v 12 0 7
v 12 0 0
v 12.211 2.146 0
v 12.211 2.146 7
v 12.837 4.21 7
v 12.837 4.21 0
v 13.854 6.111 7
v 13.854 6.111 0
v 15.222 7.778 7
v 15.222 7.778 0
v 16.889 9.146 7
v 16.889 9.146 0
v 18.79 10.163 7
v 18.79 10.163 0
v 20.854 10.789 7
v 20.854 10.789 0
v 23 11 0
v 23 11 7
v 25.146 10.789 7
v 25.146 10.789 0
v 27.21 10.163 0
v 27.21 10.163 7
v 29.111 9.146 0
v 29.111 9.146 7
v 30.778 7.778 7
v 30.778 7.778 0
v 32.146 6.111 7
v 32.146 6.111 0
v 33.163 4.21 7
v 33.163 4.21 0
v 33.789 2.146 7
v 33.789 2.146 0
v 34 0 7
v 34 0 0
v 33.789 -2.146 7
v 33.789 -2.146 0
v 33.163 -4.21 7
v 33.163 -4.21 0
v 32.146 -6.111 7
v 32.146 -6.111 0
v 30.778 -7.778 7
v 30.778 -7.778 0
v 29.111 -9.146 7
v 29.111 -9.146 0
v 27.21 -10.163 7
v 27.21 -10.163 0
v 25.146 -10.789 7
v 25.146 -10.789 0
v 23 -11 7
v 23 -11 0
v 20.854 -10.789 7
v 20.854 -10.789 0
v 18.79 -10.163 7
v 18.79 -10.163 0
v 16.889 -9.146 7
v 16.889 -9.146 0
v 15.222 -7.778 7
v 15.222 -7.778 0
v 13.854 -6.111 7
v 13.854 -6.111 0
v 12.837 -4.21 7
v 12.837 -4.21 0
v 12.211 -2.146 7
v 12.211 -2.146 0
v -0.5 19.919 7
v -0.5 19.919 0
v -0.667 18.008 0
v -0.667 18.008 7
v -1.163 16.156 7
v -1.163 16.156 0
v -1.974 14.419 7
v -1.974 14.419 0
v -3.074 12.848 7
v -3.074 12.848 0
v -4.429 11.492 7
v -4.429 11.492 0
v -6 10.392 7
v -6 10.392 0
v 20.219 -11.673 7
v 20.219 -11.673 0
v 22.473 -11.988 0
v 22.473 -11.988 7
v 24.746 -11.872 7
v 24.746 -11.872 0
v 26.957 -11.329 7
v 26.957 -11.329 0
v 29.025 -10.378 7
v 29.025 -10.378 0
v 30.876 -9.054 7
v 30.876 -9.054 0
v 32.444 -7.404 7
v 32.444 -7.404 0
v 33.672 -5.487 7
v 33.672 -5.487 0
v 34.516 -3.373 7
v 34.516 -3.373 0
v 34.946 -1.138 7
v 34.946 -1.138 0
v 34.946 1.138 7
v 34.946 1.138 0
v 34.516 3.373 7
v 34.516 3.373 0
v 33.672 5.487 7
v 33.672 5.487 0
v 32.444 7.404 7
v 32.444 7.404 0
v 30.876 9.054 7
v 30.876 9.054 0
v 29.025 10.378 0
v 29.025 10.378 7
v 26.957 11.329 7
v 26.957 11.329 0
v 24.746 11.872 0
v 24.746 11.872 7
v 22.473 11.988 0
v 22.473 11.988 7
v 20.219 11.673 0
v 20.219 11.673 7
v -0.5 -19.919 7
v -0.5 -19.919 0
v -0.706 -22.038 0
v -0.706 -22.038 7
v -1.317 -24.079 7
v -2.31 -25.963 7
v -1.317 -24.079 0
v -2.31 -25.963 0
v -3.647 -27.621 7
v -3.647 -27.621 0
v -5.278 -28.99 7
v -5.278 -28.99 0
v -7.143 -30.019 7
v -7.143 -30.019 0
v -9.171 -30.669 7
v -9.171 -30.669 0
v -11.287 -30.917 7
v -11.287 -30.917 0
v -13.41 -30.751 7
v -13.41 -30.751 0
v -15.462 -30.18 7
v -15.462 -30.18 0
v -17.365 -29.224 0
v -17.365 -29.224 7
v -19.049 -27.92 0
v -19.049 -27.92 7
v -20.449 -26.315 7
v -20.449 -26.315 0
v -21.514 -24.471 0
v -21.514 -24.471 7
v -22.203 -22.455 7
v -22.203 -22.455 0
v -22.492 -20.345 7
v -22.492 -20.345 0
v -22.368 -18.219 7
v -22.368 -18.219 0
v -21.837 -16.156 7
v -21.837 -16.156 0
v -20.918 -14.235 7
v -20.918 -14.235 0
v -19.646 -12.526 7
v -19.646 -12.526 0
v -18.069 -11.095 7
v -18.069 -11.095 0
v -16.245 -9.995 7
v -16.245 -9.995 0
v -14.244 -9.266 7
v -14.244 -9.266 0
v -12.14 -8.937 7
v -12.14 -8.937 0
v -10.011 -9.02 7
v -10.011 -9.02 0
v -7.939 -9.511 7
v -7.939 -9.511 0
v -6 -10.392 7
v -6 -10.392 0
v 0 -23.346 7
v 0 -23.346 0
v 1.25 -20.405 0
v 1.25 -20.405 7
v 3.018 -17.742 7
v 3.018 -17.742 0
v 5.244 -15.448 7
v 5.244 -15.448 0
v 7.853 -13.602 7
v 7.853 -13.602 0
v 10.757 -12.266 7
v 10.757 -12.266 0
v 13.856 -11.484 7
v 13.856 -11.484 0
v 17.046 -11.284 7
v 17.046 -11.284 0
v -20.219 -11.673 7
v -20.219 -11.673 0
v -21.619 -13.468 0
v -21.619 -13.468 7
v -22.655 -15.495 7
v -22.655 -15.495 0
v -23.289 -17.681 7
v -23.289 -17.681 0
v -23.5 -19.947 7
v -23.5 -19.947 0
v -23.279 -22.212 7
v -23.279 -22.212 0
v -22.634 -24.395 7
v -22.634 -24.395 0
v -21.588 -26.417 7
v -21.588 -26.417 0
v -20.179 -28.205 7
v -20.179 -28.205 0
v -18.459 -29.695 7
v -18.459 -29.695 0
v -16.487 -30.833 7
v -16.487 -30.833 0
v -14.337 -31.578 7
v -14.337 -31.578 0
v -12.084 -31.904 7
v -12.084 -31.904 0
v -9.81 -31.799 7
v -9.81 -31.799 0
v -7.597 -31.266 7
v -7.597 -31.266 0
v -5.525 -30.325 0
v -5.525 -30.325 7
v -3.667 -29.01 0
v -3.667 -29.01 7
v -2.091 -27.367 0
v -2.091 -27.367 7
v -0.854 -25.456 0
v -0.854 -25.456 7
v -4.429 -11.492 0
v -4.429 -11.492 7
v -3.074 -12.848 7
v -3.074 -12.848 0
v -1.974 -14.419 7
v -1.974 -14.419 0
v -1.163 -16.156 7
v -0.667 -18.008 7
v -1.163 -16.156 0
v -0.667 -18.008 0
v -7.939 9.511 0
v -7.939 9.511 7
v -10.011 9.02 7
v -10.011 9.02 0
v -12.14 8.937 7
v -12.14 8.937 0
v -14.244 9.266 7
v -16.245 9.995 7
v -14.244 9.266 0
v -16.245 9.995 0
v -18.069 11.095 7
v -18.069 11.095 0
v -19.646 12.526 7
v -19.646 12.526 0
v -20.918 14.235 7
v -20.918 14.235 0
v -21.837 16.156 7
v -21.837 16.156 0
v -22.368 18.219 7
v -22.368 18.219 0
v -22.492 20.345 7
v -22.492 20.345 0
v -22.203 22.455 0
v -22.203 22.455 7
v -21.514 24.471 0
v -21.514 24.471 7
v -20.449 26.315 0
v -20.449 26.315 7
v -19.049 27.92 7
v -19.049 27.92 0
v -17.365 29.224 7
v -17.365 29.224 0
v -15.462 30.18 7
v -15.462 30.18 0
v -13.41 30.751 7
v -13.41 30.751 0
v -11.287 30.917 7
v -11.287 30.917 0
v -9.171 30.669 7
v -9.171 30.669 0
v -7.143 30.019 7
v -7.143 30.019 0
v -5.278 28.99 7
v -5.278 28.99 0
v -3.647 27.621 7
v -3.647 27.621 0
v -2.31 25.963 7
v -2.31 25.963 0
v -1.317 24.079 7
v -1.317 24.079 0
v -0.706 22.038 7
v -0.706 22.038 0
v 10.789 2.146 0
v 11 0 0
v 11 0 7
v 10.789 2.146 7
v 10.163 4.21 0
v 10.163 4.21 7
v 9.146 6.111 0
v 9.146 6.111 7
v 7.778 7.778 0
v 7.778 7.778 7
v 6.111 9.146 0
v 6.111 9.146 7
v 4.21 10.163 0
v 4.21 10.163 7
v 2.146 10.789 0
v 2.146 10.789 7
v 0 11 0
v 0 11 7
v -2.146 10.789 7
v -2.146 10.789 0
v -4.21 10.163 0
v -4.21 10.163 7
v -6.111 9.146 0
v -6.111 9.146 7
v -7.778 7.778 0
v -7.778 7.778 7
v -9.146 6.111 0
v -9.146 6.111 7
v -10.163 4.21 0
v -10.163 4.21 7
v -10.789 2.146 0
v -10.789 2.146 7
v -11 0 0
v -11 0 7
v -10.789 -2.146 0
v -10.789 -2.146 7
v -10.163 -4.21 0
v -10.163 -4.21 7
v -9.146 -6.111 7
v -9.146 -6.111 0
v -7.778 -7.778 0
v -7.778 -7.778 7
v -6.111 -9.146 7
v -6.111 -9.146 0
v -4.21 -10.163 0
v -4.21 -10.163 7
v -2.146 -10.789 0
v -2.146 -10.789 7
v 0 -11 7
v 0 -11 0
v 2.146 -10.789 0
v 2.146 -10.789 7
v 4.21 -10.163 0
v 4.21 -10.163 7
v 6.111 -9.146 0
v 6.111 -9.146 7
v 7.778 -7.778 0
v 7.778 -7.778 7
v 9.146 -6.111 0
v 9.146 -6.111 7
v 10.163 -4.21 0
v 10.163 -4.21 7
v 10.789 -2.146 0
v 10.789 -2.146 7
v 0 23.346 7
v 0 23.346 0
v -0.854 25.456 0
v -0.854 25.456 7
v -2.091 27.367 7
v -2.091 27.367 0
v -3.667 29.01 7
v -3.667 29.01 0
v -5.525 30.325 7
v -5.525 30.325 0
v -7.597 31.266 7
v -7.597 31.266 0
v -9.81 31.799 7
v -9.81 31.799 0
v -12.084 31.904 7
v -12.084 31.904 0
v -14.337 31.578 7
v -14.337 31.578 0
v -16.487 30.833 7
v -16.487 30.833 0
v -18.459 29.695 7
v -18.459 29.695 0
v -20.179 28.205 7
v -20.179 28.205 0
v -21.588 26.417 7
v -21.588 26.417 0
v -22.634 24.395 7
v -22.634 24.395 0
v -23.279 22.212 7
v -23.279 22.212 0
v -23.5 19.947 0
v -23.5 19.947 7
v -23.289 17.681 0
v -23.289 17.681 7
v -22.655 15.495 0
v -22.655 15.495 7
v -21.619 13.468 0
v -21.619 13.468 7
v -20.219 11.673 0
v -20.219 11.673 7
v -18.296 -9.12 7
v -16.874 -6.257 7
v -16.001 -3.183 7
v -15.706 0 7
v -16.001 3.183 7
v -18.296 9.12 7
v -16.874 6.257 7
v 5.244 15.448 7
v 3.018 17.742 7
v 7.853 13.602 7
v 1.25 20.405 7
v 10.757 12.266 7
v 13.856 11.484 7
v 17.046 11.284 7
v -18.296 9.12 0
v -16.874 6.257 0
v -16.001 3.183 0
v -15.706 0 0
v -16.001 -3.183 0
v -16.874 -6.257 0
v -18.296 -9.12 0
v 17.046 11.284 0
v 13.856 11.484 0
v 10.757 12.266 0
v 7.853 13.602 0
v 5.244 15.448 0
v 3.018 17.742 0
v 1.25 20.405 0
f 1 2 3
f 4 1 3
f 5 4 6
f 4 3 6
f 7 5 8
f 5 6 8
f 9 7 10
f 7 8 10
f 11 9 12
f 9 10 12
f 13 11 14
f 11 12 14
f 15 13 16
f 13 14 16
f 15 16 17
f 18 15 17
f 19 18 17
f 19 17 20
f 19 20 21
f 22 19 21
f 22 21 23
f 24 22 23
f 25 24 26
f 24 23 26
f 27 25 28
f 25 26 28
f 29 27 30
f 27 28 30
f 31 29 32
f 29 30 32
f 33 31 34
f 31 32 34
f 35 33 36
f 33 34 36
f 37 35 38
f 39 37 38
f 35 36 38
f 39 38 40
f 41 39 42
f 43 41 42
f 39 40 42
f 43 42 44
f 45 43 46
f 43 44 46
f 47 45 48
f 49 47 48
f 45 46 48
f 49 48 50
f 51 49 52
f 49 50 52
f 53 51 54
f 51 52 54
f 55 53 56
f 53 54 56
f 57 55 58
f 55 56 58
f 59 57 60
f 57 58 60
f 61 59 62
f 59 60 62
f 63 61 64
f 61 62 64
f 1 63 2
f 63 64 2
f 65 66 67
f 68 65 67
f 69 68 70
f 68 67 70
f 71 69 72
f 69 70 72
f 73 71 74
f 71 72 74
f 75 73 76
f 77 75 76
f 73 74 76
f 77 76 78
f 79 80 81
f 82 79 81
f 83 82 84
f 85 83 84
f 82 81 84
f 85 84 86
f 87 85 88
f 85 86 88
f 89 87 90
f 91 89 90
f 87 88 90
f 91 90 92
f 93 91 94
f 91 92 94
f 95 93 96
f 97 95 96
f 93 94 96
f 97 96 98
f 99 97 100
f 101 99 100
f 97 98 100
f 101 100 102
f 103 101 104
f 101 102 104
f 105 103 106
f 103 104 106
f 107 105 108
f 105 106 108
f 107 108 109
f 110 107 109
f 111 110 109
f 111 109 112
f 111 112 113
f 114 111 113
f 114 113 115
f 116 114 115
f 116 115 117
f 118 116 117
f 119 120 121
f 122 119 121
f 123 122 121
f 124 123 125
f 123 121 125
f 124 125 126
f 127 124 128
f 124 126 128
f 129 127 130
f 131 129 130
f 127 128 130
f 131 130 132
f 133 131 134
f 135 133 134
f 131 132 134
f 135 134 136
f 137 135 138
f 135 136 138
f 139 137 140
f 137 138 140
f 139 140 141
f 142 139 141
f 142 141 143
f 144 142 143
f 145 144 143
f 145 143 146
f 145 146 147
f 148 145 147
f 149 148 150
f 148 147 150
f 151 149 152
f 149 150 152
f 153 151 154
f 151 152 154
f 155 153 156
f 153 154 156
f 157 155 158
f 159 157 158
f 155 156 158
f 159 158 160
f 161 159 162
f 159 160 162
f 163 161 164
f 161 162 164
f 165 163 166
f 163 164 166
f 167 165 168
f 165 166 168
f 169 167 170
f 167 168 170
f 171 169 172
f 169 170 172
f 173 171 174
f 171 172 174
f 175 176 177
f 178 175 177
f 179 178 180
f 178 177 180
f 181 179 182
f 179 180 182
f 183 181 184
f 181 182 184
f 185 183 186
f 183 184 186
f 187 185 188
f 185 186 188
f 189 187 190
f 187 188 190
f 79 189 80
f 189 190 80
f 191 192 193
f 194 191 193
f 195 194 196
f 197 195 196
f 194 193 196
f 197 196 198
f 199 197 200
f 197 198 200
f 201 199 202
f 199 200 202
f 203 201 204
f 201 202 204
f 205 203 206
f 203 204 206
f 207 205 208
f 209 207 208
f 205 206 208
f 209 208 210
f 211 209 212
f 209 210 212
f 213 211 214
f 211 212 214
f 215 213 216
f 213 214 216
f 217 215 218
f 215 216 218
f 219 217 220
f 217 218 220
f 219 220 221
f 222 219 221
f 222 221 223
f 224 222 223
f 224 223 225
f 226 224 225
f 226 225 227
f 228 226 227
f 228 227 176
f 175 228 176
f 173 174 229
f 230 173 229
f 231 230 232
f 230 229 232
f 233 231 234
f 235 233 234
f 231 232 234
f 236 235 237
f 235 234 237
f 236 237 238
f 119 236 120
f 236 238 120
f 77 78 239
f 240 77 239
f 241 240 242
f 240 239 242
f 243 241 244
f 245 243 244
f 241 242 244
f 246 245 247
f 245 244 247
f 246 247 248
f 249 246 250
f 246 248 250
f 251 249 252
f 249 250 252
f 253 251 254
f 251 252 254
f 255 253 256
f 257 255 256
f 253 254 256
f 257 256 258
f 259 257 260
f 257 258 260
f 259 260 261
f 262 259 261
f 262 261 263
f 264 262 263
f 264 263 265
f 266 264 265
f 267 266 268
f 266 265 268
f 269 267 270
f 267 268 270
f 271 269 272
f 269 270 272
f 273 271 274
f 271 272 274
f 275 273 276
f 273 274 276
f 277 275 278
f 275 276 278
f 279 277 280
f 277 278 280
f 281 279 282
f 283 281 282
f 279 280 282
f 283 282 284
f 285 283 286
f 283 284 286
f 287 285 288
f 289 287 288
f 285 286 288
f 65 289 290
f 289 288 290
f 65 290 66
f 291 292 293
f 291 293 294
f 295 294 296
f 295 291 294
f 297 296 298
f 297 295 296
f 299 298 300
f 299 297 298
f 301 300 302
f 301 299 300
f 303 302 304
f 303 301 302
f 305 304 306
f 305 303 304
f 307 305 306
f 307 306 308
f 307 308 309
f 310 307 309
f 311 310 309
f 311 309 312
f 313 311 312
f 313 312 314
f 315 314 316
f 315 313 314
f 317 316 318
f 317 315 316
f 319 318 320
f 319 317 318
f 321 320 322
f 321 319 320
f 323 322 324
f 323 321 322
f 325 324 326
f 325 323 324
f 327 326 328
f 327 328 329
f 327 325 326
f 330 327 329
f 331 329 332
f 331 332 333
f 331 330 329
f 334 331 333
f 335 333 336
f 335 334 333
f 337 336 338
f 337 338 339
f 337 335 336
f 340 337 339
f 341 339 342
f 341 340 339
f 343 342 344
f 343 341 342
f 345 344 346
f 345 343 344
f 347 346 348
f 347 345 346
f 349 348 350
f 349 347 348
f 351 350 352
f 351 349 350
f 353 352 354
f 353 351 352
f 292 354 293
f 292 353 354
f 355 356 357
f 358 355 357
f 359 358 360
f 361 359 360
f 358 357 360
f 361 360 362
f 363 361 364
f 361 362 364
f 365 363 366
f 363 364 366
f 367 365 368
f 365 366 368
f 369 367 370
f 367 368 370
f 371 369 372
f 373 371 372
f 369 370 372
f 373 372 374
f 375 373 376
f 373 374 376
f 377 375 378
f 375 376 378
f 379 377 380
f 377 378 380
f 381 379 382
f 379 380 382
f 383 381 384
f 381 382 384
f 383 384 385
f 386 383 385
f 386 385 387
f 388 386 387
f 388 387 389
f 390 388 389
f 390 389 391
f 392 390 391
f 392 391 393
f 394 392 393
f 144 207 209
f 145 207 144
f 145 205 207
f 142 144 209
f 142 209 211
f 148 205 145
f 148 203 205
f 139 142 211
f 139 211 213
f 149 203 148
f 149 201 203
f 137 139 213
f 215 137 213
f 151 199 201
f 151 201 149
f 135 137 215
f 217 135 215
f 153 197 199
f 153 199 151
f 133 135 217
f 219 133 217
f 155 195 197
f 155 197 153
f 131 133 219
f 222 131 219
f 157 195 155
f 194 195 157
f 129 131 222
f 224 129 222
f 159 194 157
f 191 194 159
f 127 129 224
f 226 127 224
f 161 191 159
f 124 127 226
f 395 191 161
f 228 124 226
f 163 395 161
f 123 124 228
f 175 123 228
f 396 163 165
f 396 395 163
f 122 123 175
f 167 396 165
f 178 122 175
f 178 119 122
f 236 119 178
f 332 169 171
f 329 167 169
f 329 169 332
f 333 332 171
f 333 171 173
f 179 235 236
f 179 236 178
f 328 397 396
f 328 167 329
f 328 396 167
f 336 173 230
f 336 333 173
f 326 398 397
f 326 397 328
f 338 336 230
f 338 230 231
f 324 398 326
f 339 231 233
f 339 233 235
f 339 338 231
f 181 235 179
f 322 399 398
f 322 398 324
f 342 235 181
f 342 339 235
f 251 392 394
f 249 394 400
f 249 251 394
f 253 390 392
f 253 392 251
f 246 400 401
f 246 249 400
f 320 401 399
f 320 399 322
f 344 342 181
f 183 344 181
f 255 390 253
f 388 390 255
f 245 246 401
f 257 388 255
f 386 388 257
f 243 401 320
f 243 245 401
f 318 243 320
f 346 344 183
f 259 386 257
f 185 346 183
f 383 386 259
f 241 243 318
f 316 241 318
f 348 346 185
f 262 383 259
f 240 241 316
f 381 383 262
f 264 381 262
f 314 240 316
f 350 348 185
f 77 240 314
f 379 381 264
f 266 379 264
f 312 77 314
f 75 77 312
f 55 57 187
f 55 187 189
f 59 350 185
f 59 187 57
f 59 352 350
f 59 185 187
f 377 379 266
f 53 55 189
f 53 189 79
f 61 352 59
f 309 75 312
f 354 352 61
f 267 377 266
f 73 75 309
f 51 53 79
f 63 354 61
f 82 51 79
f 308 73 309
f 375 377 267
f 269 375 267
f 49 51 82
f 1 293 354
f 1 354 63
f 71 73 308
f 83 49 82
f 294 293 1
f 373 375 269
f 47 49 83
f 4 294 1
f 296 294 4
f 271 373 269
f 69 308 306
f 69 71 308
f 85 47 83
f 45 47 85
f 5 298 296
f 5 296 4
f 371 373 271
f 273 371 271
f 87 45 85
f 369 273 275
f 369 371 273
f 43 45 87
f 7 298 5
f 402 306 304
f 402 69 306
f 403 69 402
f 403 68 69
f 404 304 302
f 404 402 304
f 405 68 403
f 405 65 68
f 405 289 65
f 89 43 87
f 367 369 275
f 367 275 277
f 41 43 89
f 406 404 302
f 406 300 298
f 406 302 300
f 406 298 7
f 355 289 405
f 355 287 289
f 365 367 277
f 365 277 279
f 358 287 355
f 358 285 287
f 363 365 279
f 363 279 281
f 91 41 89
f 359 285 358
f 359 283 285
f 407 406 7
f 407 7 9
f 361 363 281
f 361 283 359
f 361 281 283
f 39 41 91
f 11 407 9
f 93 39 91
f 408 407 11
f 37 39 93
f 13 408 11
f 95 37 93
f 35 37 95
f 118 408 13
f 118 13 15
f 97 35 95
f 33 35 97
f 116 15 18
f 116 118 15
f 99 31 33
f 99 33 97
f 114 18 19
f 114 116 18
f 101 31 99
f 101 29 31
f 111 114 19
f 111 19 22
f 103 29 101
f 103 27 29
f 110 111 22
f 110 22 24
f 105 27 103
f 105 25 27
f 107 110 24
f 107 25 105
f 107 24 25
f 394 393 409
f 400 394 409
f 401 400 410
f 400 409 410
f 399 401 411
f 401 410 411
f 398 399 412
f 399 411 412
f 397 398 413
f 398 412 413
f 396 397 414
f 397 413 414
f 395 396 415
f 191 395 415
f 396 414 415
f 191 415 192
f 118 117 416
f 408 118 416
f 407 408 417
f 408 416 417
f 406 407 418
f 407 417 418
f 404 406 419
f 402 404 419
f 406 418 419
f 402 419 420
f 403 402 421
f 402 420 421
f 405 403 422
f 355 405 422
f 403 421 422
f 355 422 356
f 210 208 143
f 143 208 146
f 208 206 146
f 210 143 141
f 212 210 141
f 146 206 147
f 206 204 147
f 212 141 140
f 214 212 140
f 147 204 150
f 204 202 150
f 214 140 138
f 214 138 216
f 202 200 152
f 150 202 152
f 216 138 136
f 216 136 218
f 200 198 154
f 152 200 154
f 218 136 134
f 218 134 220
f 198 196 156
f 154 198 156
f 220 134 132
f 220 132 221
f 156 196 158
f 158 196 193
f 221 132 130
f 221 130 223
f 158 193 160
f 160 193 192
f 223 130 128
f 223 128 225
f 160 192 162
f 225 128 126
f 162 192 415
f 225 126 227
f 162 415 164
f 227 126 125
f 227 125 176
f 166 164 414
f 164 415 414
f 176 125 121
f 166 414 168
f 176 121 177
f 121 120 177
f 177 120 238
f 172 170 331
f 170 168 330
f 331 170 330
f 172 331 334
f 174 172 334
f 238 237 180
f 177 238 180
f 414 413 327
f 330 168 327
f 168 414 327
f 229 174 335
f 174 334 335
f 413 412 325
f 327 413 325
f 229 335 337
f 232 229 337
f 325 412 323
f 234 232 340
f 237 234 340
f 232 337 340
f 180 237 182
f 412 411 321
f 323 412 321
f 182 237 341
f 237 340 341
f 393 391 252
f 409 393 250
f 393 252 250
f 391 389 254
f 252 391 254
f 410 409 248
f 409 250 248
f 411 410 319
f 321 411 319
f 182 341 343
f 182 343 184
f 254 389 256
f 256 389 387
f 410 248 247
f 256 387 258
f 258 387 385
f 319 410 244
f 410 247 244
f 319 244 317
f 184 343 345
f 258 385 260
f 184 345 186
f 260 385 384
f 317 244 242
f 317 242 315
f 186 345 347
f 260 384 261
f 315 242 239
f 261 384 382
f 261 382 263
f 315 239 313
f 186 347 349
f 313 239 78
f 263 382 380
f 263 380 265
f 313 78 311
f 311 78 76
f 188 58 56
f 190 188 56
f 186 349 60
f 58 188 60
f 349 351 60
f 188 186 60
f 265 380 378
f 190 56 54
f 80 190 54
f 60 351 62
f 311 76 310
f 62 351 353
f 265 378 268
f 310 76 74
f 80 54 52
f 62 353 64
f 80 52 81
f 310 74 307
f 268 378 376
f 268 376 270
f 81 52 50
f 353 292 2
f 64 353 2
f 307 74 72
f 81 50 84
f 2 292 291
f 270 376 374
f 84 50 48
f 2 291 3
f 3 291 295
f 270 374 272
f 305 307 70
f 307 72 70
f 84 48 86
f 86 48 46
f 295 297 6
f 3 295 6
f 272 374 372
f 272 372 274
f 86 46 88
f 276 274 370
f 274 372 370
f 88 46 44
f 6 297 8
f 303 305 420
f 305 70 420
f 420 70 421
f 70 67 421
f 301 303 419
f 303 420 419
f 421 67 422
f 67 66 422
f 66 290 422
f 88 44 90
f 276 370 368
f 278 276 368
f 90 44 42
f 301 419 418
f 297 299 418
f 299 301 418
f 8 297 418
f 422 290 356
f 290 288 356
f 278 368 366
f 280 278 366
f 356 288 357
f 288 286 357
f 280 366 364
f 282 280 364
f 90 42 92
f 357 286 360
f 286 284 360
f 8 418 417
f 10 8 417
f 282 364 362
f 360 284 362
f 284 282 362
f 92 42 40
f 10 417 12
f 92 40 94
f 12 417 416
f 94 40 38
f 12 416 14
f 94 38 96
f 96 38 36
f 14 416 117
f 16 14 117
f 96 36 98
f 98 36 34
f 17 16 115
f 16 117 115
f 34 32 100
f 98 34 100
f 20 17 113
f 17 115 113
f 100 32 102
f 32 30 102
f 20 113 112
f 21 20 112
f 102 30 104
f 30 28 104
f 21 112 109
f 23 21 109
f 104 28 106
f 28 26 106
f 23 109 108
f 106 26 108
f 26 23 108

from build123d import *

# Parameters (mm, degrees)
F0_R     = 11
F1_DEPTH = 7


with BuildPart() as f1:
    # F0 (on Top) → F1 (new body)
    with BuildSketch(Plane.XY):
        with BuildLine():
            ThreePointArc((11.5, 3.427827), (11.874342, 1.732051), (12, 0))
            ThreePointArc((12, 0), (11.874342, -1.732051), (11.5, -3.427827))
            ThreePointArc((11.5, -3.427827), (14.754622, -8.718586), (20.218586, -11.673206))
            ThreePointArc((20.218586, -11.673206), (35, 0), (20.218586, 11.673206))
            ThreePointArc((20.218586, 11.673206), (14.754622, 8.718586), (11.5, 3.427827))
        make_face()
        with BuildLine():
            ThreePointArc((34, 0), (23, -11), (12, 0))
            ThreePointArc((12, 0), (23, 11), (34, 0))
        make_face(mode=Mode.SUBTRACT)
        with BuildLine():
            ThreePointArc((-2.781414, 11.673206), (6, 10.392305), (11.5, 3.427827))
            ThreePointArc((11.5, 3.427827), (14.754622, 8.718586), (20.218586, 11.673206))
            ThreePointArc((20.218586, 11.673206), (7.853112, 13.601989), (0, 23.346412))
            ThreePointArc((0, 23.346412), (0.173206, 17.13717), (-2.781414, 11.673206))
        make_face()
        with BuildLine():
            ThreePointArc((20.218586, -11.673206), (14.754622, -8.718586), (11.5, -3.427827))
            ThreePointArc((11.5, -3.427827), (6, -10.392305), (-2.781414, -11.673206))
            ThreePointArc((-2.781414, -11.673206), (0.173206, -17.13717), (0, -23.346412))
            ThreePointArc((0, -23.346412), (7.853112, -13.601989), (20.218586, -11.673206))
        make_face()
        with BuildLine():
            ThreePointArc((-6, 10.392305), (-4.437171, 11.149507), (-2.781414, 11.673206))
            ThreePointArc((-2.781414, 11.673206), (0.173206, 17.13717), (0, 23.346412))
            ThreePointArc((0, 23.346412), (-17.5, 30.310889), (-20.218586, 11.673206))
            ThreePointArc((-20.218586, 11.673206), (-14.927827, 8.418584), (-8.718586, 8.245378))
            ThreePointArc((-8.718586, 8.245378), (-7.437171, 9.417457), (-6, 10.392305))
        make_face()
        with BuildLine():
            ThreePointArc((-0.5, 19.918584), (-1.973721, 14.418584), (-6, 10.392305))
            ThreePointArc((-6, 10.392305), (-21.026279, 25.418584), (-0.5, 19.918584))
        make_face(mode=Mode.SUBTRACT)
        with BuildLine():
            ThreePointArc((0, -23.346412), (0.173206, -17.13717), (-2.781414, -11.673206))
            ThreePointArc((-2.781414, -11.673206), (-4.437171, -11.149507), (-6, -10.392305))
            ThreePointArc((-6, -10.392305), (-7.437171, -9.417457), (-8.718586, -8.245378))
            ThreePointArc((-8.718586, -8.245378), (-14.927827, -8.418584), (-20.218586, -11.673206))
            ThreePointArc((-20.218586, -11.673206), (-17.5, -30.310889), (0, -23.346412))
        make_face()
        with BuildLine():
            ThreePointArc((-0.5, -19.918584), (-21.02628, -25.418584), (-6, -10.392305))
            ThreePointArc((-6, -10.392305), (-1.97372, -14.418584), (-0.5, -19.918584))
        make_face(mode=Mode.SUBTRACT)
        with BuildLine():
            ThreePointArc((-8.718586, -8.245378), (-12, 0), (-8.718586, 8.245378))
            ThreePointArc((-8.718586, 8.245378), (-14.927827, 8.418584), (-20.218586, 11.673206))
            ThreePointArc((-20.218586, 11.673206), (-15.706224, 0), (-20.218586, -11.673206))
            ThreePointArc((-20.218586, -11.673206), (-14.927827, -8.418584), (-8.718586, -8.245378))
        make_face()
        with BuildLine():
            ThreePointArc((11.5, -3.427827), (11.874342, -1.732051), (12, 0))
            ThreePointArc((12, 0), (11.874342, 1.732051), (11.5, 3.427827))
            ThreePointArc((11.5, 3.427827), (6, 10.392305), (-2.781414, 11.673206))
            ThreePointArc((-2.781414, 11.673206), (-4.437171, 11.149507), (-6, 10.392305))
            ThreePointArc((-6, 10.392305), (-7.437171, 9.417457), (-8.718586, 8.245378))
            ThreePointArc((-8.718586, 8.245378), (-12, 0), (-8.718586, -8.245378))
            ThreePointArc((-8.718586, -8.245378), (-7.437171, -9.417457), (-6, -10.392305))
            ThreePointArc((-6, -10.392305), (-4.437171, -11.149507), (-2.781414, -11.673206))
            ThreePointArc((-2.781414, -11.673206), (6, -10.392305), (11.5, -3.427827))
        make_face()
        Circle(F0_R, mode=Mode.SUBTRACT)
    extrude(amount=F1_DEPTH)


solid = f1.part
